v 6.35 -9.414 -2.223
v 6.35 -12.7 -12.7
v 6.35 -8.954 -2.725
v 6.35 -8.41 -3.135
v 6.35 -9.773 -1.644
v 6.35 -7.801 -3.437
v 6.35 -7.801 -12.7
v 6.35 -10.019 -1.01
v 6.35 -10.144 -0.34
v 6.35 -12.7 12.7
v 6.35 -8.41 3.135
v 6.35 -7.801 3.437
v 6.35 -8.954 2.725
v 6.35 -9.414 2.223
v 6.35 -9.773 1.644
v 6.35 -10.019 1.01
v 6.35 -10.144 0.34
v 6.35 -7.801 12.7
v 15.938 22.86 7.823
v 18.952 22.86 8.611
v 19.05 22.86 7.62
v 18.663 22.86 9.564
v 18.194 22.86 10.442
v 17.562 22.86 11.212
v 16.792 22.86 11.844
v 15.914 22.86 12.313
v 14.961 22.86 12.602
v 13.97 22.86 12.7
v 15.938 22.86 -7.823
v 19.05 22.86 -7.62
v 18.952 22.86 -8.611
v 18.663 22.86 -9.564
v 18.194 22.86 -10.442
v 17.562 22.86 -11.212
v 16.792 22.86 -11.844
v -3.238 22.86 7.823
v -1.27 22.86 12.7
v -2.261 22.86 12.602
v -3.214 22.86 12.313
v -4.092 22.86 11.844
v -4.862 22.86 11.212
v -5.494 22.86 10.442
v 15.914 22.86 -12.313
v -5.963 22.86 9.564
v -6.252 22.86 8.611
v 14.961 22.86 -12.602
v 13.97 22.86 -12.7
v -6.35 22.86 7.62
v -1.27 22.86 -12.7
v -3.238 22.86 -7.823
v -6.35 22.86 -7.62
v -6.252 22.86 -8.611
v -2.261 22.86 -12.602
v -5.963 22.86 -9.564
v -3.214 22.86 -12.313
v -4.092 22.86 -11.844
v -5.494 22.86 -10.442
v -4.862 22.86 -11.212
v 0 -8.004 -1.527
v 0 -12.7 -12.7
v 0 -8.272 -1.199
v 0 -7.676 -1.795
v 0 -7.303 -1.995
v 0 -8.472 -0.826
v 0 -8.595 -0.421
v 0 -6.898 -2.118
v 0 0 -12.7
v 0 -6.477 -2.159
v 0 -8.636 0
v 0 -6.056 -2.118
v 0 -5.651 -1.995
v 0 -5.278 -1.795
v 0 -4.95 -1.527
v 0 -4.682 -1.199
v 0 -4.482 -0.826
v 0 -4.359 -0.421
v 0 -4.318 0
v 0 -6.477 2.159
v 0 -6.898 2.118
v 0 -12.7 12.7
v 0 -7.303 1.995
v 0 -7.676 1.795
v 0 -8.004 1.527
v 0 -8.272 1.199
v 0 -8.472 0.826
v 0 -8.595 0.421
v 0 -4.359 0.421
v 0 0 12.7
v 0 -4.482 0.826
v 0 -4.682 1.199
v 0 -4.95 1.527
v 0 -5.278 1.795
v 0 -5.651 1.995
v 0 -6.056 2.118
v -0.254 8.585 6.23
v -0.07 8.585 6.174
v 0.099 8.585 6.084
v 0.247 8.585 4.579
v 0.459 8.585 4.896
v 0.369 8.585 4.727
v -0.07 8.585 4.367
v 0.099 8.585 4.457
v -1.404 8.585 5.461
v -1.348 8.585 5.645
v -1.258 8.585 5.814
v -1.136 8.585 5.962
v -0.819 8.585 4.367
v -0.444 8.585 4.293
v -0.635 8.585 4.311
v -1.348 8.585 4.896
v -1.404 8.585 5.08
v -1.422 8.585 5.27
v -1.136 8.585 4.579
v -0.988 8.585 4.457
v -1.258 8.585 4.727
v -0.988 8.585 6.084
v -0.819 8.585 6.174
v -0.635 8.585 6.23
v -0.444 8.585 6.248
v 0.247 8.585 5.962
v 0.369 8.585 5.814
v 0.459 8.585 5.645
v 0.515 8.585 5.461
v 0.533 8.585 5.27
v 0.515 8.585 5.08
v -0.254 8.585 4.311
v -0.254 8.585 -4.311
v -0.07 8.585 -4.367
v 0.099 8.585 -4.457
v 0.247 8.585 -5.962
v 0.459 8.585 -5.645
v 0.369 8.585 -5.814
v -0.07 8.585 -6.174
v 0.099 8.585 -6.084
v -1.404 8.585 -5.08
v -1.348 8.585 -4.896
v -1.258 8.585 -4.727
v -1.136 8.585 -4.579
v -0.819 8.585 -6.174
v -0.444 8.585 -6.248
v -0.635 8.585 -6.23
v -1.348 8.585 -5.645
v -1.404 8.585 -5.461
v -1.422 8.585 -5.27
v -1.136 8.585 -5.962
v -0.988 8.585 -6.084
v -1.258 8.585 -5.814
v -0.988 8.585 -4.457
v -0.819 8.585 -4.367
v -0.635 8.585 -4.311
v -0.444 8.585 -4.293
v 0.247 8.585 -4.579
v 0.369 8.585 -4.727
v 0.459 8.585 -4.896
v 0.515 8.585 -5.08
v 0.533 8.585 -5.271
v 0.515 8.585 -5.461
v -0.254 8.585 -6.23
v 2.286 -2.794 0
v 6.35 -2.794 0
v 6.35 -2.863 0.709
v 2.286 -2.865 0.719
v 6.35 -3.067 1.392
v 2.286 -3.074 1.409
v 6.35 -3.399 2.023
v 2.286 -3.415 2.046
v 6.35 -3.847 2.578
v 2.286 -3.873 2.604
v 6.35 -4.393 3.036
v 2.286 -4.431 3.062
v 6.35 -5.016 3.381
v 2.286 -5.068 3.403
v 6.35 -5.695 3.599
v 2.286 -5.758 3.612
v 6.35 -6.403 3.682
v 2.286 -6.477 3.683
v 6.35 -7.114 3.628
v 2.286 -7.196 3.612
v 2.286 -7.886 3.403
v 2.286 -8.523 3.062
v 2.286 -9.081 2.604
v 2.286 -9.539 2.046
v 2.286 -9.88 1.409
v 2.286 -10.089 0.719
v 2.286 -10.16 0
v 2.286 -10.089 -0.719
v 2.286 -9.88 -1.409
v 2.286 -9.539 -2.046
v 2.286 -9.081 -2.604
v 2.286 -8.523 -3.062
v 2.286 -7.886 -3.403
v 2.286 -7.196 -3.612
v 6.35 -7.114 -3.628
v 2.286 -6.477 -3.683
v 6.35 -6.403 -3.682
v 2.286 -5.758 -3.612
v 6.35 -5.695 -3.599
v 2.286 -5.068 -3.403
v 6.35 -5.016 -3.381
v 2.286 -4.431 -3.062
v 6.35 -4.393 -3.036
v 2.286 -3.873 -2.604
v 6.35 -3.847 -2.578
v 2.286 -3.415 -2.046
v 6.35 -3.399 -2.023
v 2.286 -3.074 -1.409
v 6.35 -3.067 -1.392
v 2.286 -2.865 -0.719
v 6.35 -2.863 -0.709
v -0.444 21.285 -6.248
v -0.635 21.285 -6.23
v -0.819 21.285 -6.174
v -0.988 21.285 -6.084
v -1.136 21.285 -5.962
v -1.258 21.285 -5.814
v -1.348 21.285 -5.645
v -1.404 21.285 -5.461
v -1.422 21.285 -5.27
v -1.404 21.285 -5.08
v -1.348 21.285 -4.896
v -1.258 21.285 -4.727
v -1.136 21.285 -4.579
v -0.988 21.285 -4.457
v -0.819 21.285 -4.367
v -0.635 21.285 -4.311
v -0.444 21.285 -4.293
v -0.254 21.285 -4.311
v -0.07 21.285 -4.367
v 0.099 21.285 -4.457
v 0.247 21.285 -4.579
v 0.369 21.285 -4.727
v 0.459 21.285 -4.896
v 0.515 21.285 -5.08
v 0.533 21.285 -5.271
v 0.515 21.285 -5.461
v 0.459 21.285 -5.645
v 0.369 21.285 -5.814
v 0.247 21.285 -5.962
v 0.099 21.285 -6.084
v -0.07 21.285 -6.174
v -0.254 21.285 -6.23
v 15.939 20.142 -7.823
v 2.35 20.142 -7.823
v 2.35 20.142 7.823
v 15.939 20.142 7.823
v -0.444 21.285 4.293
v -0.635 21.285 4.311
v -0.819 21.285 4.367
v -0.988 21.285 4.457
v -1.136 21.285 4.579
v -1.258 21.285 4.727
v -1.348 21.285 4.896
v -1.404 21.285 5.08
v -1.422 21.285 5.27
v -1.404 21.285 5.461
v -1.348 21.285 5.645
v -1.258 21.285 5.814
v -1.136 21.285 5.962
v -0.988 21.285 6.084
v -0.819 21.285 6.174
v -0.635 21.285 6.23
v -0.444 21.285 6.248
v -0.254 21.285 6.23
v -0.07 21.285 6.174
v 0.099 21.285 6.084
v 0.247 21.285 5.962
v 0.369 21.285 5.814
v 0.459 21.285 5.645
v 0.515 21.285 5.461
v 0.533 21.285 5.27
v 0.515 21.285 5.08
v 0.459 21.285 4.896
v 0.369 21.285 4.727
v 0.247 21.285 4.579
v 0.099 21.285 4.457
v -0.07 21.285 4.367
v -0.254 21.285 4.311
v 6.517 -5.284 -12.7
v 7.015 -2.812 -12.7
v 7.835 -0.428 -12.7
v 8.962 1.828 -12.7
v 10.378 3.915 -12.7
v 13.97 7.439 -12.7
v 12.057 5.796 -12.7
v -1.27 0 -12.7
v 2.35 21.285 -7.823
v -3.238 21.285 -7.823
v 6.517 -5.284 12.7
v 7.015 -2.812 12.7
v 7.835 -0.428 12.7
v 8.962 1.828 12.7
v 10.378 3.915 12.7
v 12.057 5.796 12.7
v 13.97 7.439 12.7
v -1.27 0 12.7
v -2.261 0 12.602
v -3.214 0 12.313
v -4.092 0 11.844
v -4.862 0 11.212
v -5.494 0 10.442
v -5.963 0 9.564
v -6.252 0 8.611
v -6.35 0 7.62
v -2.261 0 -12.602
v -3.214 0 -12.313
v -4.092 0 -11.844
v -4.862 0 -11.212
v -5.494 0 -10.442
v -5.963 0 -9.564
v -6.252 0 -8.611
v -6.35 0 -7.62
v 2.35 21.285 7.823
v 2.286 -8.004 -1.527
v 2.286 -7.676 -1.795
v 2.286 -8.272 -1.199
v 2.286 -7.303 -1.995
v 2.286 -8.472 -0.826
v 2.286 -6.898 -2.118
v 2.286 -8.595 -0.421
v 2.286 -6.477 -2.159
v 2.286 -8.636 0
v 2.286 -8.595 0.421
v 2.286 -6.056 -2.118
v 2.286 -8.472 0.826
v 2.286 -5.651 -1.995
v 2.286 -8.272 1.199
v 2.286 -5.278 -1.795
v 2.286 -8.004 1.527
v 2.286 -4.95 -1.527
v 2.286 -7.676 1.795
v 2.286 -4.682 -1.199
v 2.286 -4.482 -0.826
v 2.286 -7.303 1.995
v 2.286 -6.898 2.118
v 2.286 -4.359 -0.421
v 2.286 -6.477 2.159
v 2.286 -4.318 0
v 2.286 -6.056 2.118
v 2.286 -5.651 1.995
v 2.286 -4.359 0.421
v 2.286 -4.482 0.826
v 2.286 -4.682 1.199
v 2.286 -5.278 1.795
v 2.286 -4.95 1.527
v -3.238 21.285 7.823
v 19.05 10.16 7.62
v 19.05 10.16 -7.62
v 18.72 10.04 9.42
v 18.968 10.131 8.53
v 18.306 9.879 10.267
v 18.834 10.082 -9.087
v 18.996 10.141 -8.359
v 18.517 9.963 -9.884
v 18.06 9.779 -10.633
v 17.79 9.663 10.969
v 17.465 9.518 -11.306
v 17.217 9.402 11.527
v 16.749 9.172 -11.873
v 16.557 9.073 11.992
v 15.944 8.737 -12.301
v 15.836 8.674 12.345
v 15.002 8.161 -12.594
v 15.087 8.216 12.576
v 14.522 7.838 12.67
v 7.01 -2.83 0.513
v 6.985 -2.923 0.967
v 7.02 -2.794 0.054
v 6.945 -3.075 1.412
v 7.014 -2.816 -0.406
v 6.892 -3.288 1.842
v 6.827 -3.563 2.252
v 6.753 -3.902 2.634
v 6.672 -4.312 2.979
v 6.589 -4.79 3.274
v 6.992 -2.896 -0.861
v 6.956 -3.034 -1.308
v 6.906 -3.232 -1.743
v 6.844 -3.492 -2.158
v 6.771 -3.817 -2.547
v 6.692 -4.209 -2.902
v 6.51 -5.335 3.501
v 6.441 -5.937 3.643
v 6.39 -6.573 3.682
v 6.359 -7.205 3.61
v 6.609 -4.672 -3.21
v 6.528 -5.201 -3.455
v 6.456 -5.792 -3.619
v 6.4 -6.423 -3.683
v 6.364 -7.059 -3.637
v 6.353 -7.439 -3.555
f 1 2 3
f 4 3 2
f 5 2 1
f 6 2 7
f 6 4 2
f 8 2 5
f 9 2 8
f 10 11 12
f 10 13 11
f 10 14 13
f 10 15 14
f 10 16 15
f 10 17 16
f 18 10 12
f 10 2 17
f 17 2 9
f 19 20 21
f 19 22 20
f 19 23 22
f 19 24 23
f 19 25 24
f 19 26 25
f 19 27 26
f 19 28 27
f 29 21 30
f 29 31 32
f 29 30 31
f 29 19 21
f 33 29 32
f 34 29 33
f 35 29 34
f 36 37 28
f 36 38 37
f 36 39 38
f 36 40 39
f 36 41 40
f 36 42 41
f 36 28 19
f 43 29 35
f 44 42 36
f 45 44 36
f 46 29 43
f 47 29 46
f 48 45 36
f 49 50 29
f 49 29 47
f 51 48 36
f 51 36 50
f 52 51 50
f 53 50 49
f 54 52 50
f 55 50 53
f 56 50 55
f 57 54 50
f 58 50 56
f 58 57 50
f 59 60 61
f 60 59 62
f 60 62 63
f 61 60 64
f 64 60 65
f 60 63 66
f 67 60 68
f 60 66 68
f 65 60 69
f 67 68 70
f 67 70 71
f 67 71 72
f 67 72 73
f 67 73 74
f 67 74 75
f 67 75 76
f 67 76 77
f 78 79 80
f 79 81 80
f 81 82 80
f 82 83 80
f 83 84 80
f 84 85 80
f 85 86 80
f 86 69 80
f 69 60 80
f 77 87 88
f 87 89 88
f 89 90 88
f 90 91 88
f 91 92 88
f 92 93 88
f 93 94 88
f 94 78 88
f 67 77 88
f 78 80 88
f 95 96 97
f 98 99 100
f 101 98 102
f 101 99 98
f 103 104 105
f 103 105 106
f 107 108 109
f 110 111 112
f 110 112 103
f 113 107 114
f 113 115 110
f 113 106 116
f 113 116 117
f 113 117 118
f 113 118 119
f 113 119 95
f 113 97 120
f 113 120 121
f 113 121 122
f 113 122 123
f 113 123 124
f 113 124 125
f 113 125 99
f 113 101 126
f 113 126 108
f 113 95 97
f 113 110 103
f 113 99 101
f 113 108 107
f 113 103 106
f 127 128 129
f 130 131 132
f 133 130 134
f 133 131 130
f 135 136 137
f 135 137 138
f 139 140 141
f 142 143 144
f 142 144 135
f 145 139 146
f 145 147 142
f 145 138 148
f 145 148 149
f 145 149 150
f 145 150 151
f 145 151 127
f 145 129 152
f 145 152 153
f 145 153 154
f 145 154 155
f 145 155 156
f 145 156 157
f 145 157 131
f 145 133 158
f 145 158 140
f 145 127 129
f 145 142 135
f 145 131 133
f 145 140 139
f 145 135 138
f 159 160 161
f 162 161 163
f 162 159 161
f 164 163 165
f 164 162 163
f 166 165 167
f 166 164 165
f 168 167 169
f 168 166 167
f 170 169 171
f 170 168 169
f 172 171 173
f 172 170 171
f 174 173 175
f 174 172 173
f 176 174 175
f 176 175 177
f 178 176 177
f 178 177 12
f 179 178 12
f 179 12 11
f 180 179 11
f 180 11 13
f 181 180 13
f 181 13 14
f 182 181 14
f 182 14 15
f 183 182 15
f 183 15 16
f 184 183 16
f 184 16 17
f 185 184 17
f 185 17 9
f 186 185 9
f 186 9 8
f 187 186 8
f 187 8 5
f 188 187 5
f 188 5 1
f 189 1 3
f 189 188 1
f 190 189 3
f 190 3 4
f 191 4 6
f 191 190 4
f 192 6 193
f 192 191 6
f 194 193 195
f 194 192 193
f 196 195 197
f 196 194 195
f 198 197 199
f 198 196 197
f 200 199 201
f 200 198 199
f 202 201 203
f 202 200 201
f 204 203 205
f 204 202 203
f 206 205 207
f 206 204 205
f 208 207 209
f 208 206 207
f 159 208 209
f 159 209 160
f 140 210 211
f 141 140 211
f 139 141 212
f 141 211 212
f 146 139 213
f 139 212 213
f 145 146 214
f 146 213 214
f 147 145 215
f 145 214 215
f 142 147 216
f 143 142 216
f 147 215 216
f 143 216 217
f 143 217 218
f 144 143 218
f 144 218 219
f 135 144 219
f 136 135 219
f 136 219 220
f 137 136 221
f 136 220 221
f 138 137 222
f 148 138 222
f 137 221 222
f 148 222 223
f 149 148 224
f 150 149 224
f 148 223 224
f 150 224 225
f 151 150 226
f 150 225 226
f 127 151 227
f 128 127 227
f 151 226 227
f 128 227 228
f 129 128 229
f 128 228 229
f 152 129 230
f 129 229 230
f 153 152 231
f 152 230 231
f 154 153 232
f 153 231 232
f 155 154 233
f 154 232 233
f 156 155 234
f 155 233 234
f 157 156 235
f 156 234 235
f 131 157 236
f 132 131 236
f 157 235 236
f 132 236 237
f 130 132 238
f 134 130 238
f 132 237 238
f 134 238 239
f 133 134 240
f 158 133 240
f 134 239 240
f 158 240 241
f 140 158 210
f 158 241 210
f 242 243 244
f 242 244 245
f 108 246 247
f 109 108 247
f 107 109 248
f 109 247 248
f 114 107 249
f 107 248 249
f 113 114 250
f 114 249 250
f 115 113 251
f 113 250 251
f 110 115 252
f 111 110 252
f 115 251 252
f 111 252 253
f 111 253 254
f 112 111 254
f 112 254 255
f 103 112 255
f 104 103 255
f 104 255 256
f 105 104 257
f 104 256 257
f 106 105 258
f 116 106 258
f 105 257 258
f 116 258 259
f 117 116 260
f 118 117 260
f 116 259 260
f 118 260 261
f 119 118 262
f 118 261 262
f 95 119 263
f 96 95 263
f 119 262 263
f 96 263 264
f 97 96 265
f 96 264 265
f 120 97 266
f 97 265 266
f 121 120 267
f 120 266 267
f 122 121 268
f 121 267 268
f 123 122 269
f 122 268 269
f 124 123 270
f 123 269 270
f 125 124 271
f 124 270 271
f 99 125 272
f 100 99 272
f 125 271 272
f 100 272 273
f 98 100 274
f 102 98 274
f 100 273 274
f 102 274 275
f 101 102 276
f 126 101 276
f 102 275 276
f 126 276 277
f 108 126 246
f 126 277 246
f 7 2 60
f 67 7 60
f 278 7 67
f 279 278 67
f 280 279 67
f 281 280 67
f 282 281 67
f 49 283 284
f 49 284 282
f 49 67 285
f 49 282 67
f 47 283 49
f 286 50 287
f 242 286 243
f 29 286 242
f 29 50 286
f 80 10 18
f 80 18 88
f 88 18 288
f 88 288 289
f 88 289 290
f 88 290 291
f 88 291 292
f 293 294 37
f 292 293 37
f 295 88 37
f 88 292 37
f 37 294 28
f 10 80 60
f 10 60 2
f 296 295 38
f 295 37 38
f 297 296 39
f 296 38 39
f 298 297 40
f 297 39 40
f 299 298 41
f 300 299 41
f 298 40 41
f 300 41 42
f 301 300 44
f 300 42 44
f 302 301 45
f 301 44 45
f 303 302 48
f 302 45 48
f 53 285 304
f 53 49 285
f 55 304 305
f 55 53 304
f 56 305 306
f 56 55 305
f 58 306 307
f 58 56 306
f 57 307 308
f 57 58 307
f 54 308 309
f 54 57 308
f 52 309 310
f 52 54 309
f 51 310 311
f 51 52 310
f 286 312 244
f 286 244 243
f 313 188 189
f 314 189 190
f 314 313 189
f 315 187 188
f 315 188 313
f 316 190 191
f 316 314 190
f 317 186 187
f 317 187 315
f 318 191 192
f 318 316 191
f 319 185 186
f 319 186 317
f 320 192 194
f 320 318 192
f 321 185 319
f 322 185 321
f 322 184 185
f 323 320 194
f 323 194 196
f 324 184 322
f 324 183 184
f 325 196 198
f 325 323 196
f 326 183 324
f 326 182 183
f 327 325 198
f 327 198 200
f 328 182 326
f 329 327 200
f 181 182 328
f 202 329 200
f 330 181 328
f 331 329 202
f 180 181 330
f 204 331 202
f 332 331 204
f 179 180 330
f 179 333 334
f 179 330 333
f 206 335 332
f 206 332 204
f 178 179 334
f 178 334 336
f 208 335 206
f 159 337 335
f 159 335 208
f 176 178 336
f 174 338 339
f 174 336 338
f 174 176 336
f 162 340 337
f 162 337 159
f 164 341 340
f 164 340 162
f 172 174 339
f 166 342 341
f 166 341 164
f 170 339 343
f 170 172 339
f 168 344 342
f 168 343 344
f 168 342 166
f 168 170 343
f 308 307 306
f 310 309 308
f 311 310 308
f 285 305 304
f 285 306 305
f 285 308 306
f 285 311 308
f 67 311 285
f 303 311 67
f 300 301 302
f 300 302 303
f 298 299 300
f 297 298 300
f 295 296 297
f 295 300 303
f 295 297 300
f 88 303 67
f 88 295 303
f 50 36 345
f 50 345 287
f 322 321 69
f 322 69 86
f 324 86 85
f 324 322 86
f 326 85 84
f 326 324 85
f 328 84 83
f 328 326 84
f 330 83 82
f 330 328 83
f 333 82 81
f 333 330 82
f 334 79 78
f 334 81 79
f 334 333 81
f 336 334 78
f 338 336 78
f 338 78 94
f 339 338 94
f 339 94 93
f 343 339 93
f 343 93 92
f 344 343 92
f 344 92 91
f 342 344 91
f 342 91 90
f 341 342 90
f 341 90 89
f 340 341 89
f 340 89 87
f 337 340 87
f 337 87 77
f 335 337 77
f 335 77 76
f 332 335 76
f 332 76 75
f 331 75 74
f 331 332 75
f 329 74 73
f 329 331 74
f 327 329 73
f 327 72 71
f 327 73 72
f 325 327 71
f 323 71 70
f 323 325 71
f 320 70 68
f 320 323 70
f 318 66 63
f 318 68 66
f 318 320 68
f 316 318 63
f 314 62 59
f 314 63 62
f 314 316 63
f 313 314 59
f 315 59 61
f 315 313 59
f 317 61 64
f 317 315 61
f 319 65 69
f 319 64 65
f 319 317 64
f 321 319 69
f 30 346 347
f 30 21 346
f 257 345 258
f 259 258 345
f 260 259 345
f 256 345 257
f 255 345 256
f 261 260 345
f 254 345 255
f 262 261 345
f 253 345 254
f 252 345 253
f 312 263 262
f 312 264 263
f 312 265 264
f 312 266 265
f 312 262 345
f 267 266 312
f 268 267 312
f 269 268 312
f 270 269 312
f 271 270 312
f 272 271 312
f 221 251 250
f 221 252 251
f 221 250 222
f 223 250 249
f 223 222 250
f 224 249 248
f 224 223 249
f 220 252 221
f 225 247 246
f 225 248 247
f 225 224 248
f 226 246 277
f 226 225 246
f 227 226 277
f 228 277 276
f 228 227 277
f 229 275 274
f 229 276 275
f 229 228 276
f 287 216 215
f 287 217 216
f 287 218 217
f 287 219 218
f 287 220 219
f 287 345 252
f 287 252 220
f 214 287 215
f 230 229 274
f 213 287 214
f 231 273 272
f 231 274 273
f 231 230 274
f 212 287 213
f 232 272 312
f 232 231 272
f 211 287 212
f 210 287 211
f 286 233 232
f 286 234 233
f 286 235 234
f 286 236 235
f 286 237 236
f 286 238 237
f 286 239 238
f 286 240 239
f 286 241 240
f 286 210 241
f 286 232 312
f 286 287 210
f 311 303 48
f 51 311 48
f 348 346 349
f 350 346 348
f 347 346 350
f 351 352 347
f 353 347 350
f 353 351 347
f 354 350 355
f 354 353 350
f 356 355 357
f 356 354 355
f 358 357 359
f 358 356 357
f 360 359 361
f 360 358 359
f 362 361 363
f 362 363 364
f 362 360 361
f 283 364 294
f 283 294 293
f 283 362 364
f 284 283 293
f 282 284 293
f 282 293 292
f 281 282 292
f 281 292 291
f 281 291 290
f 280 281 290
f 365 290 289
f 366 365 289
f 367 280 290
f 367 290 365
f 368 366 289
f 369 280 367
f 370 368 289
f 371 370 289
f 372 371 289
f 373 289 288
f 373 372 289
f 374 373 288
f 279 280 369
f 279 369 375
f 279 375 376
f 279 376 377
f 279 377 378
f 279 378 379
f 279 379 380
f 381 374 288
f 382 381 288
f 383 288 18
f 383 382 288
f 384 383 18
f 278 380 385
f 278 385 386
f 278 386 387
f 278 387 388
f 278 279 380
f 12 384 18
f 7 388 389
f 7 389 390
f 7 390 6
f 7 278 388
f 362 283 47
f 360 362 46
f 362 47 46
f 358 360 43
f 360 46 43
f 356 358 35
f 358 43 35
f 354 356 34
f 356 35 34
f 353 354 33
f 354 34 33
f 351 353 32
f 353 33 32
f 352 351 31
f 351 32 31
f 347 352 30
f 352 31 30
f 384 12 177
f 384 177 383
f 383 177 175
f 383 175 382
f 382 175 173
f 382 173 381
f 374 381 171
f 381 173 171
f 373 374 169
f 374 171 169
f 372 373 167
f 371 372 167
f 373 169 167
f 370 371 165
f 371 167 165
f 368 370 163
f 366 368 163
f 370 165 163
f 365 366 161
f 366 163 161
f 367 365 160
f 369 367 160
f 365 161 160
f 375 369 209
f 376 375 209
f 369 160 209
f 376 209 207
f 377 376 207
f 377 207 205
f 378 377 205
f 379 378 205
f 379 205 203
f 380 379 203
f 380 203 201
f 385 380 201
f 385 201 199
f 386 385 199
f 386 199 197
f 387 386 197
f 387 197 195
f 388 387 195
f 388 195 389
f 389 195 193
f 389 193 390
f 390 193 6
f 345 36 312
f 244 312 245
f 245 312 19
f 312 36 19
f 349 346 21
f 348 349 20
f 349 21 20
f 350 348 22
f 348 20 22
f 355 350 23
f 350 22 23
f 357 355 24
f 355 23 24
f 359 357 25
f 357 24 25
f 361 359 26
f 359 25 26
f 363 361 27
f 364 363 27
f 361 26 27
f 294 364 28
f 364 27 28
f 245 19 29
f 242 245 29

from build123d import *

# Parameters (mm, degrees)
PROFILE_W               = 12.7
PROFILE_H               = 22.86
PROFILE_W_2             = 6.35
PROFILE_H_2             = 12.7
BOSS_EXTRUDE1_DEPTH     = 12.7
CUT_EXTRUDE1_DEPTH      = 27.910817528
CUT_EXTRUDE1_DEPTH_BACK = 27.910817528
SCREWHOLE_R             = 2.159
CUT_EXTRUDE2_START      = -4.064
SKETCH3_R               = 3.683
SKETCH3_R_2             = 2.159
CUT_EXTRUDE2_DEPTH      = 4.064
SKETCH4_W               = 25.4
SKETCH4_H               = 12.7
BOSS_EXTRUDE2_DEPTH     = 12.7
SKETCH6_W               = 19.177
SKETCH6_H               = 15.6464
CUT_EXTRUDE3_DEPTH      = 1.5748
SKETCH9_W               = 13.589
SKETCH9_H               = 15.6464
CUT_EXTRUDE5_DEPTH      = 1.143
SKETCH7_R               = 0.9779
CUT_EXTRUDE6_DEPTH      = 12.7
FILLET1_R               = 19.05
FILLET2_R               = 5.08


with BuildPart() as part:
    # Profile → Boss-Extrude1 (new, symmetric)
    with BuildSketch(Plane.XY):
        with Locations((0, 11.43)):
            Rectangle(PROFILE_W, PROFILE_H)
        with Locations((3.175, -6.35)):
            Rectangle(PROFILE_W_2, PROFILE_H_2)
    extrude(amount=BOSS_EXTRUDE1_DEPTH, both=True)

    # ScrewHole → Cut-Extrude1 (cut, two sides: drawn at the far end of the back side and taken through both)
    with BuildSketch(Plane.ZY.offset(-CUT_EXTRUDE1_DEPTH_BACK)):
        with Locations(Location((0, -6.477, 0), (0, 0, 270))):
            Circle(SCREWHOLE_R)
    extrude(amount=CUT_EXTRUDE1_DEPTH + CUT_EXTRUDE1_DEPTH_BACK, mode=Mode.SUBTRACT)

    # Sketch3 → Cut-Extrude2 (cut)
    with BuildSketch(Plane(origin=(6.35, 0, 0), x_dir=(0, 0, -1), z_dir=(1, 0, 0)).offset(CUT_EXTRUDE2_START)):
        with Locations(Location((0, -6.477, 0), (0, 0, 90))):
            Circle(SKETCH3_R)
        with Locations(Location((0, -6.477, 0), (0, 0, 270))):
            Circle(SKETCH3_R_2, mode=Mode.SUBTRACT)
    extrude(amount=CUT_EXTRUDE2_DEPTH, mode=Mode.SUBTRACT)

    # Sketch4 → Boss-Extrude2 (add)
    with BuildSketch(Plane(origin=(6.35, 0, 0), x_dir=(0, 0, -1), z_dir=(1, 0, 0))):
        with Locations((0, 16.51)):
            Rectangle(SKETCH4_W, SKETCH4_H)
    extrude(amount=BOSS_EXTRUDE2_DEPTH)

    # Sketch6 → Cut-Extrude3 (cut)
    with BuildSketch(Plane(origin=(0, 22.86, 0), x_dir=(1, 0, 0), z_dir=(0, 1, 0))):
        with Locations((6.35, 0)):
            Rectangle(SKETCH6_W, SKETCH6_H)
    extrude(amount=-CUT_EXTRUDE3_DEPTH, mode=Mode.SUBTRACT)

    # Sketch9 → Cut-Extrude5 (cut)
    with BuildSketch(Plane(origin=(0, 21.2852, 0), x_dir=(1, 0, 0), z_dir=(0, 1, 0))):
        with Locations((9.144, 0)):
            Rectangle(SKETCH9_W, SKETCH9_H)
    extrude(amount=-CUT_EXTRUDE5_DEPTH, mode=Mode.SUBTRACT)

    # Sketch7 → Cut-Extrude6 (cut)
    with BuildSketch(Plane(origin=(0, 21.2852, 0), x_dir=(1, 0, 0), z_dir=(0, 1, 0))):
        with Locations(Location((-0.4445, -5.2705, 0), (0, 0, 90))):
            Circle(SKETCH7_R)
        with Locations(Location((-0.4445, 5.2705, 0), (0, 0, 90))):
            Circle(SKETCH7_R)
    extrude(amount=-CUT_EXTRUDE6_DEPTH, mode=Mode.SUBTRACT)

    # Fillet1
    # the kernel refuses this fillet: 19.05 mm, written as the material it adds along each edge
    with BuildSketch(Plane(origin=(6.35, 10.16, -12.7), x_dir=(0, -1, 0), z_dir=(0, 0, 1))) as fillet1_piece_1_section:
        with BuildLine():
            CenterArc((17.960512242, 19.05), FILLET1_R, 199.471220634, 70.528779366)
            Line((0, 12.7), (0, 0))
            Line((0, 0), (17.960512242, 0))
        make_face()
    fillet1_piece_1 = extrude(amount=25.4, mode=Mode.PRIVATE)
    fillet1_piece_1 = fillet1_piece_1 - Plane(origin=(6.35, -6.477, 0), x_dir=(0, 1, 0), z_dir=(-1, 0, 0)) * Cylinder(3.683, 123, mode=Mode.PRIVATE)
    add(fillet1_piece_1)

    # Fillet2
    fillet2_edges = [part.edges().sort_by_distance(p)[0] for p in [
        (-6.35, 11.43, 12.7),
        (19.05, 16.51, 12.7),
        (19.05, 16.51, -12.7),
        (-6.35, 11.43, -12.7),
    ]]
    fillet(fillet2_edges, radius=FILLET2_R)


solid = part.part
